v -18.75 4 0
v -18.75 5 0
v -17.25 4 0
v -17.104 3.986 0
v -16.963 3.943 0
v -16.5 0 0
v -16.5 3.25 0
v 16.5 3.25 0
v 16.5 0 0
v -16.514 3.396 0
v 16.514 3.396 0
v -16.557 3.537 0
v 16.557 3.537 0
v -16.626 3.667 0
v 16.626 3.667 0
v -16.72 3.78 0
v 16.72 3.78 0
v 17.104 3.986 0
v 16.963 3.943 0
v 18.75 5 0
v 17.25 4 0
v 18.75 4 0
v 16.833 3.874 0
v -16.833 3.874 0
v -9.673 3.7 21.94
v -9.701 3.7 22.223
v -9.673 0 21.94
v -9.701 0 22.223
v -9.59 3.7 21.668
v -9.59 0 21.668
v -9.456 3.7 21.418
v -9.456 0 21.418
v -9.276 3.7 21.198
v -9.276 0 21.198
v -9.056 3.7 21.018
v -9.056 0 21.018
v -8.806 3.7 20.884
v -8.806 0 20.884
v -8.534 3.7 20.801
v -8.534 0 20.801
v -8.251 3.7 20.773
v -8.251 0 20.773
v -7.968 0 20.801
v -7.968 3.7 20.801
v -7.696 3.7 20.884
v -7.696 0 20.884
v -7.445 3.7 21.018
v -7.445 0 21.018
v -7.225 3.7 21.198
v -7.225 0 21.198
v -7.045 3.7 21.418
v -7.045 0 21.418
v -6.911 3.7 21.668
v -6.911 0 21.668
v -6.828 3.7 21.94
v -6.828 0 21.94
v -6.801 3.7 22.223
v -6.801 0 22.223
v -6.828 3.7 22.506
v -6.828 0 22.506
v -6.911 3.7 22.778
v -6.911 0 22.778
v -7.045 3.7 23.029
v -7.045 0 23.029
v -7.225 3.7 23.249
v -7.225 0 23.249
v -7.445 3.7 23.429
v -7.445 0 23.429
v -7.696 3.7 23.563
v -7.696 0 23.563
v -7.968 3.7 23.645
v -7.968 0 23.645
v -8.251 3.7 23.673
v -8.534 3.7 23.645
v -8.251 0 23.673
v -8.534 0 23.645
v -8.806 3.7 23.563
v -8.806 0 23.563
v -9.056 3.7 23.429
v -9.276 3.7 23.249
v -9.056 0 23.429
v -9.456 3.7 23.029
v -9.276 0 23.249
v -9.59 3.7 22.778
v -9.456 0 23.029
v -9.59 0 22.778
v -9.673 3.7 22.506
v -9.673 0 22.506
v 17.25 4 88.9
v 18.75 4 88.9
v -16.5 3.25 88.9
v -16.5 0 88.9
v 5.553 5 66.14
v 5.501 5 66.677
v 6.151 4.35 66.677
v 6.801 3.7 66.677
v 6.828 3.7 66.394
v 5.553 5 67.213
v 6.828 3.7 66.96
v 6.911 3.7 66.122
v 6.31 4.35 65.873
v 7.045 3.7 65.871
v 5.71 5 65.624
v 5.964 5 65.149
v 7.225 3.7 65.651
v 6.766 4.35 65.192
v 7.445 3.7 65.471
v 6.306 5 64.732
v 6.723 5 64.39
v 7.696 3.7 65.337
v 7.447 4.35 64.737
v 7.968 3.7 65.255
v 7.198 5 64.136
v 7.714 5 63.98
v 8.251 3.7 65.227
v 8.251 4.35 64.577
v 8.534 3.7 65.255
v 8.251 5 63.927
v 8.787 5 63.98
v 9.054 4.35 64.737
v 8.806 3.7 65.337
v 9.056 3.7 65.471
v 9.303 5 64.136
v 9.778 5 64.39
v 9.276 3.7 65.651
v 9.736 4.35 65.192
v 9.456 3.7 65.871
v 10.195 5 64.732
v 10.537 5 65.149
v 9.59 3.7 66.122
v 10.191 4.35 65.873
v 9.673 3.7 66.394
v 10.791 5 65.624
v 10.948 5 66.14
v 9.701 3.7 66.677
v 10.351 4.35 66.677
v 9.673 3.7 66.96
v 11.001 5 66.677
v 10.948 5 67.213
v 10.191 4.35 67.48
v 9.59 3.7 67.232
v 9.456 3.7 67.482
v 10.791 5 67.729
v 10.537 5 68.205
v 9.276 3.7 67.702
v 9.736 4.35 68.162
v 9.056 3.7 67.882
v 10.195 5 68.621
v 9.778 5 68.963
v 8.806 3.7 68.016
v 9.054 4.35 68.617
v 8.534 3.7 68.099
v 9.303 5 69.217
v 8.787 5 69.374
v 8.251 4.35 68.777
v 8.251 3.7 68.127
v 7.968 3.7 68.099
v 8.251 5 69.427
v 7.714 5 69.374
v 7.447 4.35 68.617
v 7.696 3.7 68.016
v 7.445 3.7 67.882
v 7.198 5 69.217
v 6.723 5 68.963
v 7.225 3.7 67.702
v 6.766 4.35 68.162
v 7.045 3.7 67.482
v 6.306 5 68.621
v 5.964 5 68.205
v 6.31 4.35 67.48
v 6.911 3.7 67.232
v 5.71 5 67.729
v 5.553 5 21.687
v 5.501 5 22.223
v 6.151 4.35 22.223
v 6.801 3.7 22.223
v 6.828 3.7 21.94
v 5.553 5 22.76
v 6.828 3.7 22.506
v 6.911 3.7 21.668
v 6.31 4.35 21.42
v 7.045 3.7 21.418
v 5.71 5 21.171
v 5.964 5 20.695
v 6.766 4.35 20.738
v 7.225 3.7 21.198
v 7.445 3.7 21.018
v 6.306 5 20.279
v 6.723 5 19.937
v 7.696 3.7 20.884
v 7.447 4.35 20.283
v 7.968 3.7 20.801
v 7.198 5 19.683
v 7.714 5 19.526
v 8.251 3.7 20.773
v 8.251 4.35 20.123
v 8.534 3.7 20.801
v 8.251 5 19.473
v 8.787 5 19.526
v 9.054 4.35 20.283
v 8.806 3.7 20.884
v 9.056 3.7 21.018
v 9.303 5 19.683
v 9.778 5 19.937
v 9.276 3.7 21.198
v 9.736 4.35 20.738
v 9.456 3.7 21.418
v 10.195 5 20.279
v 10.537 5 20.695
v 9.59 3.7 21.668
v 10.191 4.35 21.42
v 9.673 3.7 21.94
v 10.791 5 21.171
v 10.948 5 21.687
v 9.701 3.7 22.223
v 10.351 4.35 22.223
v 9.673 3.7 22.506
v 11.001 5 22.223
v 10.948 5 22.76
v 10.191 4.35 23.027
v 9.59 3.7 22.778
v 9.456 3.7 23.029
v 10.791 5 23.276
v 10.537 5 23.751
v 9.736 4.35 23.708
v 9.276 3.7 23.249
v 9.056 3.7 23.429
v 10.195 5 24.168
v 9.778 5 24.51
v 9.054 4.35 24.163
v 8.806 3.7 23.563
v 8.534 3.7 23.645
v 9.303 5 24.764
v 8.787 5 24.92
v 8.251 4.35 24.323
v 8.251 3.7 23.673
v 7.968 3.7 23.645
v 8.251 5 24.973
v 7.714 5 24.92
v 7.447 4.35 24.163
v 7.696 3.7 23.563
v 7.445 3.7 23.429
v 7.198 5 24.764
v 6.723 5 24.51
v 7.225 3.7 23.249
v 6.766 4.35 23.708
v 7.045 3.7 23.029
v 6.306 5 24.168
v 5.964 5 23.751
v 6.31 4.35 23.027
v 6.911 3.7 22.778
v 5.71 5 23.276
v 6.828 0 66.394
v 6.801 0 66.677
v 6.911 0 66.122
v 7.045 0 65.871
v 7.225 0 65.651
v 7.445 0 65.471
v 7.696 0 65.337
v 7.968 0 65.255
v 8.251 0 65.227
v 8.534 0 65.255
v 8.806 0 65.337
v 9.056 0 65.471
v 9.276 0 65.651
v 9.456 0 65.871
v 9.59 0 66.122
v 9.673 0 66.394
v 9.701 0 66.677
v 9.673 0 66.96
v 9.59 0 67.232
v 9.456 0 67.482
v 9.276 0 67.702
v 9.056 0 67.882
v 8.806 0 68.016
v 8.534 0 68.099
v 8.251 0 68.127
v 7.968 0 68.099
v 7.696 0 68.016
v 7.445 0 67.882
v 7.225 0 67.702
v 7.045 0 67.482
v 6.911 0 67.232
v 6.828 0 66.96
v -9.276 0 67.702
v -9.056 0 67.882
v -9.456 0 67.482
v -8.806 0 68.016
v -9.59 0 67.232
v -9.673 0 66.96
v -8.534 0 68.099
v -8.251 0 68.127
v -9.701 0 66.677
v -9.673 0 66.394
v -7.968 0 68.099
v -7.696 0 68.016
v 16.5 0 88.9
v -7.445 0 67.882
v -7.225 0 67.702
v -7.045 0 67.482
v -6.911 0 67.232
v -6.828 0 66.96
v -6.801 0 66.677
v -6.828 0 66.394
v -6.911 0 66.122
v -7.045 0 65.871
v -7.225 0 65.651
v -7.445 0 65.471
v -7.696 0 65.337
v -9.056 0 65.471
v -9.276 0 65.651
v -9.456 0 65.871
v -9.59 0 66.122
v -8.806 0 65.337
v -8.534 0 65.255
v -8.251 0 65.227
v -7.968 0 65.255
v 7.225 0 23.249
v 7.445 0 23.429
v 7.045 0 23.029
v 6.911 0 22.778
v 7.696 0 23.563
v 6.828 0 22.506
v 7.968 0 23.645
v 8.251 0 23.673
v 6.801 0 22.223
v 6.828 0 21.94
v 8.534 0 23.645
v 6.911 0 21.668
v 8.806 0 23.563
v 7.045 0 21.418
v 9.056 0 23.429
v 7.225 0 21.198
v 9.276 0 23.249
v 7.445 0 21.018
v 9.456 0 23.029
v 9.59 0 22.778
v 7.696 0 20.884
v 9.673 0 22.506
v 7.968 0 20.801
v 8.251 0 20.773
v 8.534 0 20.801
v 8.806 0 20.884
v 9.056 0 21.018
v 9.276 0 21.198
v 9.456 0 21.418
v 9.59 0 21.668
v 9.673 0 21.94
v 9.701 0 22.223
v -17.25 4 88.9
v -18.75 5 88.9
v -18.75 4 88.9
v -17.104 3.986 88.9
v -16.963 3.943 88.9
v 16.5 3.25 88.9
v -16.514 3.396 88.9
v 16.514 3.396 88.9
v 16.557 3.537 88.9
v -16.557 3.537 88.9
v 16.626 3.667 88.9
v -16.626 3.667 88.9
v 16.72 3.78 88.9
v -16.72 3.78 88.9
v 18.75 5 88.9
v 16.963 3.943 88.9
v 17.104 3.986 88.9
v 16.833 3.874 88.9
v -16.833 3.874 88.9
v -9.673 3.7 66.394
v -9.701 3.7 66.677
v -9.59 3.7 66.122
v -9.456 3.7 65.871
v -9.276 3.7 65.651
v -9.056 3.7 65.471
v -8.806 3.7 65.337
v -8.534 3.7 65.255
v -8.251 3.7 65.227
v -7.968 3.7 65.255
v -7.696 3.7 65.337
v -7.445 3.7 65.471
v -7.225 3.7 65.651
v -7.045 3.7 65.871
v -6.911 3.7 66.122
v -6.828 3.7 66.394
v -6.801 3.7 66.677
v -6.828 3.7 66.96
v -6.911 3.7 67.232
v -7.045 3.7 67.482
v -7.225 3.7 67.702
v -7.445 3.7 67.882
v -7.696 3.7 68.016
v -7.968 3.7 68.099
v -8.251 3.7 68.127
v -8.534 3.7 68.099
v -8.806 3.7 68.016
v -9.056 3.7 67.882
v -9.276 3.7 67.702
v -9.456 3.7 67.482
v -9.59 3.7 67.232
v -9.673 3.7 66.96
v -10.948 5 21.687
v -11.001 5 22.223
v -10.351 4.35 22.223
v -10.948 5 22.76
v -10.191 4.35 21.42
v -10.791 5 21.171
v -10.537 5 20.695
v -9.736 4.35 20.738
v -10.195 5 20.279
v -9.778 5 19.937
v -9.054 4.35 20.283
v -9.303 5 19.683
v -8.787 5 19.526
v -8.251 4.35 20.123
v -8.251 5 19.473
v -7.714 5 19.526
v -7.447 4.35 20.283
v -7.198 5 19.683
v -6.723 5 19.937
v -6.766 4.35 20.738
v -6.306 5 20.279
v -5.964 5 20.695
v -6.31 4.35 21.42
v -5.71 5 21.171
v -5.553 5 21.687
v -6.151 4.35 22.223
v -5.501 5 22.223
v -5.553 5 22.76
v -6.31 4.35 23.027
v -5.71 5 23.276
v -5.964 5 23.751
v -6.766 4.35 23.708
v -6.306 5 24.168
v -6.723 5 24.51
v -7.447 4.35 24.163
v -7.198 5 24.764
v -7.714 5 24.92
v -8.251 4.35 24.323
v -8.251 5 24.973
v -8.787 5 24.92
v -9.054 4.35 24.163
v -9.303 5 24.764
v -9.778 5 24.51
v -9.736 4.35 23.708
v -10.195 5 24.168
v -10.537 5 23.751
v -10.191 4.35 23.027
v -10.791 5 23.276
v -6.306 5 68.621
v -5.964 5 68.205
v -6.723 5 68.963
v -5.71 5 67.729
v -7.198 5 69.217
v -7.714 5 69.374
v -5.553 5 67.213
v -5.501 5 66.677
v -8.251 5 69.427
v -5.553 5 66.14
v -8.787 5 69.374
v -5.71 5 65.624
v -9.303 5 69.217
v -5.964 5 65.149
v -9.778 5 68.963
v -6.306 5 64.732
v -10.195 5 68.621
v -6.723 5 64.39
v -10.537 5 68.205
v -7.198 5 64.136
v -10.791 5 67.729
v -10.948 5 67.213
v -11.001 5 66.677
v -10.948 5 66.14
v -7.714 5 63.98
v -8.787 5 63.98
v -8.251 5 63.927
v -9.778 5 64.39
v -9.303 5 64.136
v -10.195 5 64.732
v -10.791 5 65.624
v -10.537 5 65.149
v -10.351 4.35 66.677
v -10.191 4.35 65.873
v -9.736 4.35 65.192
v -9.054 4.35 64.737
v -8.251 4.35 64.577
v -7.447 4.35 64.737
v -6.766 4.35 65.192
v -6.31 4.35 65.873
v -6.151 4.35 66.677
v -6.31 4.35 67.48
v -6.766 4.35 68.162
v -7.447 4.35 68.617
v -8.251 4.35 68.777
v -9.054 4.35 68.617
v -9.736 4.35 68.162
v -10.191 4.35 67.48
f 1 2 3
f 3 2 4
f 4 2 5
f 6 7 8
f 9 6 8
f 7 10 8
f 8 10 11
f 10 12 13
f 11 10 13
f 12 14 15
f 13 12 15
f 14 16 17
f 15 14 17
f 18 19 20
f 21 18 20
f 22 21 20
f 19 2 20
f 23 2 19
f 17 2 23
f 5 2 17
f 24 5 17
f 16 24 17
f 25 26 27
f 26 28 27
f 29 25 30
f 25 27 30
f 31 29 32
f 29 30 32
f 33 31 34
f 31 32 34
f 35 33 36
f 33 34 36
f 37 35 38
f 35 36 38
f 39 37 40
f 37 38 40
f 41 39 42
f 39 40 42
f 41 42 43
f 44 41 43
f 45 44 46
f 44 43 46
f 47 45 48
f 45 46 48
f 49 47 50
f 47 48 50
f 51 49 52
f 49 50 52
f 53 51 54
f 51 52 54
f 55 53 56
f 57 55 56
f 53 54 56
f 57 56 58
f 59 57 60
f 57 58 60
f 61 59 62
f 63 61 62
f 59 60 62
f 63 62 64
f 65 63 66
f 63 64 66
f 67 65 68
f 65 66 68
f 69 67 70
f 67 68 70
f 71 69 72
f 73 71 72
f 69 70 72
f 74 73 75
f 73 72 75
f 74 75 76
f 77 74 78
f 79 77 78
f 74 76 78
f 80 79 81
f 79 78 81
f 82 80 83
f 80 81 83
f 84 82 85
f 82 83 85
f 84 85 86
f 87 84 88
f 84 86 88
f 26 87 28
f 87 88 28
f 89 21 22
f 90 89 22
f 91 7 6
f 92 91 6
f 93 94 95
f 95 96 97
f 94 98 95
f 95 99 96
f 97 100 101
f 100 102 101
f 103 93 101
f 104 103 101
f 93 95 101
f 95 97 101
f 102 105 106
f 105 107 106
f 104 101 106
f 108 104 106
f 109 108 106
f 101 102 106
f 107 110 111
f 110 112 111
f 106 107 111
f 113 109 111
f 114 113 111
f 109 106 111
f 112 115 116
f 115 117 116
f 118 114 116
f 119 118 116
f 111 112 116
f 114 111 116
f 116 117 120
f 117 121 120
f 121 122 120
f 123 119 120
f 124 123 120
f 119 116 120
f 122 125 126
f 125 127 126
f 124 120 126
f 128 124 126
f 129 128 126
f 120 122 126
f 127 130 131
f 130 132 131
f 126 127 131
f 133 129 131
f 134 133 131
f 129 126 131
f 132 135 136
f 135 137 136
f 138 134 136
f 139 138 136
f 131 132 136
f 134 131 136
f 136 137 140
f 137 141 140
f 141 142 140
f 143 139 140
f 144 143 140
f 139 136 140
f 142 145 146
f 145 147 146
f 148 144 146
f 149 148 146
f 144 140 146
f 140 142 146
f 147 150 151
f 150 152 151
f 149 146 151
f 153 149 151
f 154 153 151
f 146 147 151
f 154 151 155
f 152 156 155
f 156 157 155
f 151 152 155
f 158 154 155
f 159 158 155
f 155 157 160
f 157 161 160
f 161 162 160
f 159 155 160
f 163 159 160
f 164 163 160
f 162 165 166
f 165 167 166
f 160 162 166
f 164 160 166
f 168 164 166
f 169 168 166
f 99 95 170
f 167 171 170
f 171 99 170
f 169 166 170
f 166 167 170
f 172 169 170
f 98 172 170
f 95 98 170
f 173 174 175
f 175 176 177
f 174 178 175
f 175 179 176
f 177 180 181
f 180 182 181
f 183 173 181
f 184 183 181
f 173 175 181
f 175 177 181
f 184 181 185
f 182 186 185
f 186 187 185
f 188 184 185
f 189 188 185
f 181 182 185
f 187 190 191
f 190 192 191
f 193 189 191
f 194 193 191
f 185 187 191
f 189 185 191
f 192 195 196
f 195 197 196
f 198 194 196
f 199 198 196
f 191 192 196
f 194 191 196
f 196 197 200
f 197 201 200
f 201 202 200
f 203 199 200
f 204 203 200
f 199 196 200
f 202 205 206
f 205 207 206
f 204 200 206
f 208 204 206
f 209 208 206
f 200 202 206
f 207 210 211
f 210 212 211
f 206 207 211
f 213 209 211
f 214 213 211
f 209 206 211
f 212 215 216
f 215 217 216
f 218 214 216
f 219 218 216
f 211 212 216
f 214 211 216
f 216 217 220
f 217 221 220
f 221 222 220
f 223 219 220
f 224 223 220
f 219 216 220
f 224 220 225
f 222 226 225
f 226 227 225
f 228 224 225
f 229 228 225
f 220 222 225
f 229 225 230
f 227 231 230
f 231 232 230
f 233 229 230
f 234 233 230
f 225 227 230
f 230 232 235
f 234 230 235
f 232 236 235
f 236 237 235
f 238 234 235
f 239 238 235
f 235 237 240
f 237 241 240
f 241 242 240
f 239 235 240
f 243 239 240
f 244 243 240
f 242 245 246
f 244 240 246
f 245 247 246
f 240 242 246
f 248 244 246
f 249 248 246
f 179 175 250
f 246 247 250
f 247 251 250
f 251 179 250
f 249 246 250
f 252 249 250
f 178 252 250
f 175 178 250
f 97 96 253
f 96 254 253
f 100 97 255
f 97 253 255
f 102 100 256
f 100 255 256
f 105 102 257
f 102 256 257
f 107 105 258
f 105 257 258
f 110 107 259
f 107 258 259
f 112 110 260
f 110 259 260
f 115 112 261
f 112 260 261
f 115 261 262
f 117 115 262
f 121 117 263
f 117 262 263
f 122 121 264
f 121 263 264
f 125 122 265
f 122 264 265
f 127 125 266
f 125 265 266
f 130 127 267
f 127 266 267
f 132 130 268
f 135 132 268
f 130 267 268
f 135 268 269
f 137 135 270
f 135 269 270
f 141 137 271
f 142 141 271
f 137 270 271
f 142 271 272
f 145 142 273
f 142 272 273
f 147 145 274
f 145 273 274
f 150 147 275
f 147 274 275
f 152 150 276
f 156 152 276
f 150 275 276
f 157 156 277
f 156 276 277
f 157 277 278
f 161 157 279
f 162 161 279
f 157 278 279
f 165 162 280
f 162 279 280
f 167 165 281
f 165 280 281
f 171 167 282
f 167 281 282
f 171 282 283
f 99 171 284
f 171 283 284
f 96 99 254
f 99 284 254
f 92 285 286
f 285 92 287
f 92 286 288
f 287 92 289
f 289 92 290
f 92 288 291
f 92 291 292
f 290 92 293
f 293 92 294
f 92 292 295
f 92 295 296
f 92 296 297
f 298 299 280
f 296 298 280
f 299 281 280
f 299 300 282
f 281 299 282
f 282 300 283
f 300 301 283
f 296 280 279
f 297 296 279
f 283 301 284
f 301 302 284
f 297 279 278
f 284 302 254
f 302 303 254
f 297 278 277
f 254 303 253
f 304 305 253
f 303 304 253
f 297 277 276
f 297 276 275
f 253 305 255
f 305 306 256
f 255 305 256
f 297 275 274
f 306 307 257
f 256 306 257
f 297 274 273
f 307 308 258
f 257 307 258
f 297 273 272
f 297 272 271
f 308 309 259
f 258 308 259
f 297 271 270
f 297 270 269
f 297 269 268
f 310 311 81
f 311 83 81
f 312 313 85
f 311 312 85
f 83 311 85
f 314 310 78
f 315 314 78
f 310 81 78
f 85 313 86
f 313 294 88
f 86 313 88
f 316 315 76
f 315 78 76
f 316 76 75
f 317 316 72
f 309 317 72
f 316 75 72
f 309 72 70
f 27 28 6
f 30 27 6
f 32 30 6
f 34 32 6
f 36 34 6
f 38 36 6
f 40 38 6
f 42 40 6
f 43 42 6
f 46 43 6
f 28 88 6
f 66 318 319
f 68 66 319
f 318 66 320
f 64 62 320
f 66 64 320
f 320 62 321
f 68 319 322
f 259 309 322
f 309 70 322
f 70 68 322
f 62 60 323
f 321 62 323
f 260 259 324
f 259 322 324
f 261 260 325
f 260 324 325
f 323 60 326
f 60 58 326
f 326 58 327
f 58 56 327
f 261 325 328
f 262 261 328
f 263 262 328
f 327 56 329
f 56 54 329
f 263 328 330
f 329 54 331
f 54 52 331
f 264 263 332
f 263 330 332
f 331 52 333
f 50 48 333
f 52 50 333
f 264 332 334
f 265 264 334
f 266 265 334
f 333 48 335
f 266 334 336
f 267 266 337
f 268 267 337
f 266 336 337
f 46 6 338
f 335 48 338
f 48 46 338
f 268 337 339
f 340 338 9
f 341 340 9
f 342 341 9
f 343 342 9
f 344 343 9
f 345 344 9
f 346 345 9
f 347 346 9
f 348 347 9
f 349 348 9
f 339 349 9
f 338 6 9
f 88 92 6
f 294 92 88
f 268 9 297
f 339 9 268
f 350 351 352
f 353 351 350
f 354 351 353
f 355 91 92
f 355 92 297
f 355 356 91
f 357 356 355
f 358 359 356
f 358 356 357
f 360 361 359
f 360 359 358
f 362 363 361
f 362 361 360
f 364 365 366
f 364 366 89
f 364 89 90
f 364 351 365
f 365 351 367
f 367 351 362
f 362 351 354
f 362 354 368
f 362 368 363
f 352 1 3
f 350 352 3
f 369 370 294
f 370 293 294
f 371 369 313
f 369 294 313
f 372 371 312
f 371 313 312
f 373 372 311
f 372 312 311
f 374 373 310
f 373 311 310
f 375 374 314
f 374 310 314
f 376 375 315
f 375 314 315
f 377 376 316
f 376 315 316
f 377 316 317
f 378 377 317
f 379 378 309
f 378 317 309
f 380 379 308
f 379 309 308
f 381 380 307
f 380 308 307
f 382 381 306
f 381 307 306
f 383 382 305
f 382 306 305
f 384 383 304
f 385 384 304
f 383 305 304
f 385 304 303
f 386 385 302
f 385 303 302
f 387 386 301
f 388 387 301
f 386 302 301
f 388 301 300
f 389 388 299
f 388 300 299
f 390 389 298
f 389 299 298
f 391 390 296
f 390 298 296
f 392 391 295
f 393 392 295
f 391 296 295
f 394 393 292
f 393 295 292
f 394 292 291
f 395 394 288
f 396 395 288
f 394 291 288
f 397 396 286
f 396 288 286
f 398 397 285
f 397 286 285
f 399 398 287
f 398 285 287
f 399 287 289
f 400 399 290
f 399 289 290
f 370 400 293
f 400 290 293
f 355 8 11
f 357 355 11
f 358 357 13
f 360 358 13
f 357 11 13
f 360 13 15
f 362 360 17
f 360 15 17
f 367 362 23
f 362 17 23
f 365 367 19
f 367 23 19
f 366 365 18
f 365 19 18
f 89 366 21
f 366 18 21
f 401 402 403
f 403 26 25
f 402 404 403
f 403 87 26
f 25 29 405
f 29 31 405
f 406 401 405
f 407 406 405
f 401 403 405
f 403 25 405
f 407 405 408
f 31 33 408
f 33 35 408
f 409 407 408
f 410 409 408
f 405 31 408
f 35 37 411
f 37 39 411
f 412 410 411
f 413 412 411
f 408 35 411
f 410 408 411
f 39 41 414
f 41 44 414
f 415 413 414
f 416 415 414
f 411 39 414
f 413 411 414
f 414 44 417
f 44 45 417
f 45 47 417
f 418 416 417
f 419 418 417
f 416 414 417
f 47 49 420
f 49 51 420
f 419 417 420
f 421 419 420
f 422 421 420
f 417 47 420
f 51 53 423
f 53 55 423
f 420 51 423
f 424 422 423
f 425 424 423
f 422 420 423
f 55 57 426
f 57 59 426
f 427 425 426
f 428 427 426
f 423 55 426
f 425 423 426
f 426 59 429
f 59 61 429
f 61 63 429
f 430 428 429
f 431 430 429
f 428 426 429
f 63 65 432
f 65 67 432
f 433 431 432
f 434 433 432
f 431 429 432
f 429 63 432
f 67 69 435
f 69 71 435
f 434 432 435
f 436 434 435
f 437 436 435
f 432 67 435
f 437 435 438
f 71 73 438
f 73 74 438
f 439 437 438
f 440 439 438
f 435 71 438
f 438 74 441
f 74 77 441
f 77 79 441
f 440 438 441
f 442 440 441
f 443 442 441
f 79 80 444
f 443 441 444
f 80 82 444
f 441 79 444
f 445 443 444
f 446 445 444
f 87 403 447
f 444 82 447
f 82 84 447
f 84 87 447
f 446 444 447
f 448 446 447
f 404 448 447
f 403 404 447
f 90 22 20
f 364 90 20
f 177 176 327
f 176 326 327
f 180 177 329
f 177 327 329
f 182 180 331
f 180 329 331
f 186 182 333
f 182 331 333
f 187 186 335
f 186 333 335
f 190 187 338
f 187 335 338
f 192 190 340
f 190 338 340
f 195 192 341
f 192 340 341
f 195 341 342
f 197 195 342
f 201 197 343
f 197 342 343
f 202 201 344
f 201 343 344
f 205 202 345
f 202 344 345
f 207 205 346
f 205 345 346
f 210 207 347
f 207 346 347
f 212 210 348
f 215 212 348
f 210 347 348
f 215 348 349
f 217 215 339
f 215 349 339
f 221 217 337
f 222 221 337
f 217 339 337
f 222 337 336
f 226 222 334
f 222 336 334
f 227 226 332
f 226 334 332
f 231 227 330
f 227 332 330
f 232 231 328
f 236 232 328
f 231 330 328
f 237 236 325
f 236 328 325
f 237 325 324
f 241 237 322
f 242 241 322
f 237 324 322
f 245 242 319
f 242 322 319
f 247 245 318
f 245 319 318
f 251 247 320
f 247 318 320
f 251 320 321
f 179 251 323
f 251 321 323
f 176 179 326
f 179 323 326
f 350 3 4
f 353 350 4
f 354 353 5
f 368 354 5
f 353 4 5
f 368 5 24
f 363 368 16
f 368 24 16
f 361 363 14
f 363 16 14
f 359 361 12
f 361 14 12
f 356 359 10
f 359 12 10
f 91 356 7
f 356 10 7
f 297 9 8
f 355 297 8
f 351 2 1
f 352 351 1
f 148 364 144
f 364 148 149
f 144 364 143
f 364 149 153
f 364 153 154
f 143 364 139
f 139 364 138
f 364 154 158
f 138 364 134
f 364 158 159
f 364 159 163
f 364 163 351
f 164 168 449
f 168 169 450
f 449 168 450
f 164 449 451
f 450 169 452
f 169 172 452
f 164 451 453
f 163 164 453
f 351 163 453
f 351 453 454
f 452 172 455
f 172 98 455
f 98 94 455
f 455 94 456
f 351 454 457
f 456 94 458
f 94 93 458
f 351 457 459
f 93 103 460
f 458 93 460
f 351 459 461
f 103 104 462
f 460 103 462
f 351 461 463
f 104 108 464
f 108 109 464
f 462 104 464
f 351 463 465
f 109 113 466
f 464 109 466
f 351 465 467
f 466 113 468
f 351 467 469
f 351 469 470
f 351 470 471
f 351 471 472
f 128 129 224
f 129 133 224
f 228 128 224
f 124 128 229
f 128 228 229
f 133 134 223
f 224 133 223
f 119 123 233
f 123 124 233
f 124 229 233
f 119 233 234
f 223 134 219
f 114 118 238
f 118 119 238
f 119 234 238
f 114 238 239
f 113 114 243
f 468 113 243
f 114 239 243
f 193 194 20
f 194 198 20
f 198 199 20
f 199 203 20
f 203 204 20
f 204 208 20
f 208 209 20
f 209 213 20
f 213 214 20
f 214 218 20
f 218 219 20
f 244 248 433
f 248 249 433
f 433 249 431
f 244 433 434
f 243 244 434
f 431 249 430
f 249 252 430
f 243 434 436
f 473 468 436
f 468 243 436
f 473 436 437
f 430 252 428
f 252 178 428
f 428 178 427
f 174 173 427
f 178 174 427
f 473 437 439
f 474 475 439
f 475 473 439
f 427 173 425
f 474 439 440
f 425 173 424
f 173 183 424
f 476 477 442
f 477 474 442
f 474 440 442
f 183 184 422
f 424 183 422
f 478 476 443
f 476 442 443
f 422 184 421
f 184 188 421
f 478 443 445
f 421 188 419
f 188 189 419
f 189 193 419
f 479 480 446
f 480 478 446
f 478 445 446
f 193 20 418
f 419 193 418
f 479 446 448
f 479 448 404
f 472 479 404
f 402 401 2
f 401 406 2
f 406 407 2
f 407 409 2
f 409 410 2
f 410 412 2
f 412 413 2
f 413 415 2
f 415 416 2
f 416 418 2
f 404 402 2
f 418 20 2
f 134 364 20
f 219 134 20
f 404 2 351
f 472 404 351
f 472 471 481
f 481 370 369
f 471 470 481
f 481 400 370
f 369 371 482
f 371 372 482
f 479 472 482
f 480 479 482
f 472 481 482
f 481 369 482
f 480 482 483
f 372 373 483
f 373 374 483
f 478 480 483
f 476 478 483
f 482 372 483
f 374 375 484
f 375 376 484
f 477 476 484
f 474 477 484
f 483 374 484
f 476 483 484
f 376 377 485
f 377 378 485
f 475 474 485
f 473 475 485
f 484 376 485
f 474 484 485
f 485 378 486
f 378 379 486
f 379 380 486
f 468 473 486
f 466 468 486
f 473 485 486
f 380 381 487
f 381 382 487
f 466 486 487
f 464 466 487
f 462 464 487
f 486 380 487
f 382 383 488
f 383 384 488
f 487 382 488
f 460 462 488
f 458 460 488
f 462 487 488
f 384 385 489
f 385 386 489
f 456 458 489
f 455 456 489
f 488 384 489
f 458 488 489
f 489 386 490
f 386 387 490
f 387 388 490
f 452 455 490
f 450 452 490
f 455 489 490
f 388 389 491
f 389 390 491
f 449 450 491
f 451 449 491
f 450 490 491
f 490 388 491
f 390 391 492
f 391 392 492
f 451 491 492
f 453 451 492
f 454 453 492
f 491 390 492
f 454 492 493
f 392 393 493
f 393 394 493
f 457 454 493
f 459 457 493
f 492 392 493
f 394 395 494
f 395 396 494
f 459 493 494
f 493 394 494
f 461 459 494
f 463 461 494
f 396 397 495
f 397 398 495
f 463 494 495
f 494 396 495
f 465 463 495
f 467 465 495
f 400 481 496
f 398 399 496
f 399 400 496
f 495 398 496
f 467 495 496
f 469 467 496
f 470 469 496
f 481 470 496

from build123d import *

# Parameters (mm, degrees)
BOSS_EXTRUDE1_DEPTH                               = 88.9
CSK_FOR_M2_5_FLAT_HEAD_MACHINE_SCREW1_D           = 2.9
CSK_FOR_M2_5_FLAT_HEAD_MACHINE_SCREW1_CSINK_D     = 5.5
CSK_FOR_M2_5_FLAT_HEAD_MACHINE_SCREW1_CSINK_ANGLE = 90


with BuildPart() as part:
    # Sketch1 → Boss-Extrude1 (new body)
    with BuildSketch(Plane.XY):
        with BuildLine():
            Line((-16.5, 3.25), (-16.5, 0))
            Line((-16.5, 0), (16.5, 0))
            Line((16.5, 0), (16.5, 3.25))
            ThreePointArc((16.5, 3.25), (16.719669914, 3.780330086), (17.25, 4))
            Line((17.25, 4), (18.75, 4))
            Line((18.75, 4), (18.75, 5))
            Line((18.75, 5), (-18.75, 5))
            Line((-18.75, 5), (-18.75, 4))
            Line((-18.75, 4), (-17.25, 4))
            ThreePointArc((-17.25, 4), (-16.719669914, 3.780330086), (-16.5, 3.25))
        make_face()
    extrude(amount=BOSS_EXTRUDE1_DEPTH)

    # CSK for M2.5 Flat Head Machine Screw1 (through all)
    with Locations(Plane(origin=(0, 5, 0), x_dir=(1, 0, 0), z_dir=(0, 1, 0))):
        with Locations((8.250631971, -22.223297508), (-8.250631971, -22.223297508), (-8.250631971, -66.676702492), (8.250631971, -66.676702492)):
            CounterSinkHole(CSK_FOR_M2_5_FLAT_HEAD_MACHINE_SCREW1_D / 2, CSK_FOR_M2_5_FLAT_HEAD_MACHINE_SCREW1_CSINK_D / 2, counter_sink_angle=CSK_FOR_M2_5_FLAT_HEAD_MACHINE_SCREW1_CSINK_ANGLE)


solid = part.part
